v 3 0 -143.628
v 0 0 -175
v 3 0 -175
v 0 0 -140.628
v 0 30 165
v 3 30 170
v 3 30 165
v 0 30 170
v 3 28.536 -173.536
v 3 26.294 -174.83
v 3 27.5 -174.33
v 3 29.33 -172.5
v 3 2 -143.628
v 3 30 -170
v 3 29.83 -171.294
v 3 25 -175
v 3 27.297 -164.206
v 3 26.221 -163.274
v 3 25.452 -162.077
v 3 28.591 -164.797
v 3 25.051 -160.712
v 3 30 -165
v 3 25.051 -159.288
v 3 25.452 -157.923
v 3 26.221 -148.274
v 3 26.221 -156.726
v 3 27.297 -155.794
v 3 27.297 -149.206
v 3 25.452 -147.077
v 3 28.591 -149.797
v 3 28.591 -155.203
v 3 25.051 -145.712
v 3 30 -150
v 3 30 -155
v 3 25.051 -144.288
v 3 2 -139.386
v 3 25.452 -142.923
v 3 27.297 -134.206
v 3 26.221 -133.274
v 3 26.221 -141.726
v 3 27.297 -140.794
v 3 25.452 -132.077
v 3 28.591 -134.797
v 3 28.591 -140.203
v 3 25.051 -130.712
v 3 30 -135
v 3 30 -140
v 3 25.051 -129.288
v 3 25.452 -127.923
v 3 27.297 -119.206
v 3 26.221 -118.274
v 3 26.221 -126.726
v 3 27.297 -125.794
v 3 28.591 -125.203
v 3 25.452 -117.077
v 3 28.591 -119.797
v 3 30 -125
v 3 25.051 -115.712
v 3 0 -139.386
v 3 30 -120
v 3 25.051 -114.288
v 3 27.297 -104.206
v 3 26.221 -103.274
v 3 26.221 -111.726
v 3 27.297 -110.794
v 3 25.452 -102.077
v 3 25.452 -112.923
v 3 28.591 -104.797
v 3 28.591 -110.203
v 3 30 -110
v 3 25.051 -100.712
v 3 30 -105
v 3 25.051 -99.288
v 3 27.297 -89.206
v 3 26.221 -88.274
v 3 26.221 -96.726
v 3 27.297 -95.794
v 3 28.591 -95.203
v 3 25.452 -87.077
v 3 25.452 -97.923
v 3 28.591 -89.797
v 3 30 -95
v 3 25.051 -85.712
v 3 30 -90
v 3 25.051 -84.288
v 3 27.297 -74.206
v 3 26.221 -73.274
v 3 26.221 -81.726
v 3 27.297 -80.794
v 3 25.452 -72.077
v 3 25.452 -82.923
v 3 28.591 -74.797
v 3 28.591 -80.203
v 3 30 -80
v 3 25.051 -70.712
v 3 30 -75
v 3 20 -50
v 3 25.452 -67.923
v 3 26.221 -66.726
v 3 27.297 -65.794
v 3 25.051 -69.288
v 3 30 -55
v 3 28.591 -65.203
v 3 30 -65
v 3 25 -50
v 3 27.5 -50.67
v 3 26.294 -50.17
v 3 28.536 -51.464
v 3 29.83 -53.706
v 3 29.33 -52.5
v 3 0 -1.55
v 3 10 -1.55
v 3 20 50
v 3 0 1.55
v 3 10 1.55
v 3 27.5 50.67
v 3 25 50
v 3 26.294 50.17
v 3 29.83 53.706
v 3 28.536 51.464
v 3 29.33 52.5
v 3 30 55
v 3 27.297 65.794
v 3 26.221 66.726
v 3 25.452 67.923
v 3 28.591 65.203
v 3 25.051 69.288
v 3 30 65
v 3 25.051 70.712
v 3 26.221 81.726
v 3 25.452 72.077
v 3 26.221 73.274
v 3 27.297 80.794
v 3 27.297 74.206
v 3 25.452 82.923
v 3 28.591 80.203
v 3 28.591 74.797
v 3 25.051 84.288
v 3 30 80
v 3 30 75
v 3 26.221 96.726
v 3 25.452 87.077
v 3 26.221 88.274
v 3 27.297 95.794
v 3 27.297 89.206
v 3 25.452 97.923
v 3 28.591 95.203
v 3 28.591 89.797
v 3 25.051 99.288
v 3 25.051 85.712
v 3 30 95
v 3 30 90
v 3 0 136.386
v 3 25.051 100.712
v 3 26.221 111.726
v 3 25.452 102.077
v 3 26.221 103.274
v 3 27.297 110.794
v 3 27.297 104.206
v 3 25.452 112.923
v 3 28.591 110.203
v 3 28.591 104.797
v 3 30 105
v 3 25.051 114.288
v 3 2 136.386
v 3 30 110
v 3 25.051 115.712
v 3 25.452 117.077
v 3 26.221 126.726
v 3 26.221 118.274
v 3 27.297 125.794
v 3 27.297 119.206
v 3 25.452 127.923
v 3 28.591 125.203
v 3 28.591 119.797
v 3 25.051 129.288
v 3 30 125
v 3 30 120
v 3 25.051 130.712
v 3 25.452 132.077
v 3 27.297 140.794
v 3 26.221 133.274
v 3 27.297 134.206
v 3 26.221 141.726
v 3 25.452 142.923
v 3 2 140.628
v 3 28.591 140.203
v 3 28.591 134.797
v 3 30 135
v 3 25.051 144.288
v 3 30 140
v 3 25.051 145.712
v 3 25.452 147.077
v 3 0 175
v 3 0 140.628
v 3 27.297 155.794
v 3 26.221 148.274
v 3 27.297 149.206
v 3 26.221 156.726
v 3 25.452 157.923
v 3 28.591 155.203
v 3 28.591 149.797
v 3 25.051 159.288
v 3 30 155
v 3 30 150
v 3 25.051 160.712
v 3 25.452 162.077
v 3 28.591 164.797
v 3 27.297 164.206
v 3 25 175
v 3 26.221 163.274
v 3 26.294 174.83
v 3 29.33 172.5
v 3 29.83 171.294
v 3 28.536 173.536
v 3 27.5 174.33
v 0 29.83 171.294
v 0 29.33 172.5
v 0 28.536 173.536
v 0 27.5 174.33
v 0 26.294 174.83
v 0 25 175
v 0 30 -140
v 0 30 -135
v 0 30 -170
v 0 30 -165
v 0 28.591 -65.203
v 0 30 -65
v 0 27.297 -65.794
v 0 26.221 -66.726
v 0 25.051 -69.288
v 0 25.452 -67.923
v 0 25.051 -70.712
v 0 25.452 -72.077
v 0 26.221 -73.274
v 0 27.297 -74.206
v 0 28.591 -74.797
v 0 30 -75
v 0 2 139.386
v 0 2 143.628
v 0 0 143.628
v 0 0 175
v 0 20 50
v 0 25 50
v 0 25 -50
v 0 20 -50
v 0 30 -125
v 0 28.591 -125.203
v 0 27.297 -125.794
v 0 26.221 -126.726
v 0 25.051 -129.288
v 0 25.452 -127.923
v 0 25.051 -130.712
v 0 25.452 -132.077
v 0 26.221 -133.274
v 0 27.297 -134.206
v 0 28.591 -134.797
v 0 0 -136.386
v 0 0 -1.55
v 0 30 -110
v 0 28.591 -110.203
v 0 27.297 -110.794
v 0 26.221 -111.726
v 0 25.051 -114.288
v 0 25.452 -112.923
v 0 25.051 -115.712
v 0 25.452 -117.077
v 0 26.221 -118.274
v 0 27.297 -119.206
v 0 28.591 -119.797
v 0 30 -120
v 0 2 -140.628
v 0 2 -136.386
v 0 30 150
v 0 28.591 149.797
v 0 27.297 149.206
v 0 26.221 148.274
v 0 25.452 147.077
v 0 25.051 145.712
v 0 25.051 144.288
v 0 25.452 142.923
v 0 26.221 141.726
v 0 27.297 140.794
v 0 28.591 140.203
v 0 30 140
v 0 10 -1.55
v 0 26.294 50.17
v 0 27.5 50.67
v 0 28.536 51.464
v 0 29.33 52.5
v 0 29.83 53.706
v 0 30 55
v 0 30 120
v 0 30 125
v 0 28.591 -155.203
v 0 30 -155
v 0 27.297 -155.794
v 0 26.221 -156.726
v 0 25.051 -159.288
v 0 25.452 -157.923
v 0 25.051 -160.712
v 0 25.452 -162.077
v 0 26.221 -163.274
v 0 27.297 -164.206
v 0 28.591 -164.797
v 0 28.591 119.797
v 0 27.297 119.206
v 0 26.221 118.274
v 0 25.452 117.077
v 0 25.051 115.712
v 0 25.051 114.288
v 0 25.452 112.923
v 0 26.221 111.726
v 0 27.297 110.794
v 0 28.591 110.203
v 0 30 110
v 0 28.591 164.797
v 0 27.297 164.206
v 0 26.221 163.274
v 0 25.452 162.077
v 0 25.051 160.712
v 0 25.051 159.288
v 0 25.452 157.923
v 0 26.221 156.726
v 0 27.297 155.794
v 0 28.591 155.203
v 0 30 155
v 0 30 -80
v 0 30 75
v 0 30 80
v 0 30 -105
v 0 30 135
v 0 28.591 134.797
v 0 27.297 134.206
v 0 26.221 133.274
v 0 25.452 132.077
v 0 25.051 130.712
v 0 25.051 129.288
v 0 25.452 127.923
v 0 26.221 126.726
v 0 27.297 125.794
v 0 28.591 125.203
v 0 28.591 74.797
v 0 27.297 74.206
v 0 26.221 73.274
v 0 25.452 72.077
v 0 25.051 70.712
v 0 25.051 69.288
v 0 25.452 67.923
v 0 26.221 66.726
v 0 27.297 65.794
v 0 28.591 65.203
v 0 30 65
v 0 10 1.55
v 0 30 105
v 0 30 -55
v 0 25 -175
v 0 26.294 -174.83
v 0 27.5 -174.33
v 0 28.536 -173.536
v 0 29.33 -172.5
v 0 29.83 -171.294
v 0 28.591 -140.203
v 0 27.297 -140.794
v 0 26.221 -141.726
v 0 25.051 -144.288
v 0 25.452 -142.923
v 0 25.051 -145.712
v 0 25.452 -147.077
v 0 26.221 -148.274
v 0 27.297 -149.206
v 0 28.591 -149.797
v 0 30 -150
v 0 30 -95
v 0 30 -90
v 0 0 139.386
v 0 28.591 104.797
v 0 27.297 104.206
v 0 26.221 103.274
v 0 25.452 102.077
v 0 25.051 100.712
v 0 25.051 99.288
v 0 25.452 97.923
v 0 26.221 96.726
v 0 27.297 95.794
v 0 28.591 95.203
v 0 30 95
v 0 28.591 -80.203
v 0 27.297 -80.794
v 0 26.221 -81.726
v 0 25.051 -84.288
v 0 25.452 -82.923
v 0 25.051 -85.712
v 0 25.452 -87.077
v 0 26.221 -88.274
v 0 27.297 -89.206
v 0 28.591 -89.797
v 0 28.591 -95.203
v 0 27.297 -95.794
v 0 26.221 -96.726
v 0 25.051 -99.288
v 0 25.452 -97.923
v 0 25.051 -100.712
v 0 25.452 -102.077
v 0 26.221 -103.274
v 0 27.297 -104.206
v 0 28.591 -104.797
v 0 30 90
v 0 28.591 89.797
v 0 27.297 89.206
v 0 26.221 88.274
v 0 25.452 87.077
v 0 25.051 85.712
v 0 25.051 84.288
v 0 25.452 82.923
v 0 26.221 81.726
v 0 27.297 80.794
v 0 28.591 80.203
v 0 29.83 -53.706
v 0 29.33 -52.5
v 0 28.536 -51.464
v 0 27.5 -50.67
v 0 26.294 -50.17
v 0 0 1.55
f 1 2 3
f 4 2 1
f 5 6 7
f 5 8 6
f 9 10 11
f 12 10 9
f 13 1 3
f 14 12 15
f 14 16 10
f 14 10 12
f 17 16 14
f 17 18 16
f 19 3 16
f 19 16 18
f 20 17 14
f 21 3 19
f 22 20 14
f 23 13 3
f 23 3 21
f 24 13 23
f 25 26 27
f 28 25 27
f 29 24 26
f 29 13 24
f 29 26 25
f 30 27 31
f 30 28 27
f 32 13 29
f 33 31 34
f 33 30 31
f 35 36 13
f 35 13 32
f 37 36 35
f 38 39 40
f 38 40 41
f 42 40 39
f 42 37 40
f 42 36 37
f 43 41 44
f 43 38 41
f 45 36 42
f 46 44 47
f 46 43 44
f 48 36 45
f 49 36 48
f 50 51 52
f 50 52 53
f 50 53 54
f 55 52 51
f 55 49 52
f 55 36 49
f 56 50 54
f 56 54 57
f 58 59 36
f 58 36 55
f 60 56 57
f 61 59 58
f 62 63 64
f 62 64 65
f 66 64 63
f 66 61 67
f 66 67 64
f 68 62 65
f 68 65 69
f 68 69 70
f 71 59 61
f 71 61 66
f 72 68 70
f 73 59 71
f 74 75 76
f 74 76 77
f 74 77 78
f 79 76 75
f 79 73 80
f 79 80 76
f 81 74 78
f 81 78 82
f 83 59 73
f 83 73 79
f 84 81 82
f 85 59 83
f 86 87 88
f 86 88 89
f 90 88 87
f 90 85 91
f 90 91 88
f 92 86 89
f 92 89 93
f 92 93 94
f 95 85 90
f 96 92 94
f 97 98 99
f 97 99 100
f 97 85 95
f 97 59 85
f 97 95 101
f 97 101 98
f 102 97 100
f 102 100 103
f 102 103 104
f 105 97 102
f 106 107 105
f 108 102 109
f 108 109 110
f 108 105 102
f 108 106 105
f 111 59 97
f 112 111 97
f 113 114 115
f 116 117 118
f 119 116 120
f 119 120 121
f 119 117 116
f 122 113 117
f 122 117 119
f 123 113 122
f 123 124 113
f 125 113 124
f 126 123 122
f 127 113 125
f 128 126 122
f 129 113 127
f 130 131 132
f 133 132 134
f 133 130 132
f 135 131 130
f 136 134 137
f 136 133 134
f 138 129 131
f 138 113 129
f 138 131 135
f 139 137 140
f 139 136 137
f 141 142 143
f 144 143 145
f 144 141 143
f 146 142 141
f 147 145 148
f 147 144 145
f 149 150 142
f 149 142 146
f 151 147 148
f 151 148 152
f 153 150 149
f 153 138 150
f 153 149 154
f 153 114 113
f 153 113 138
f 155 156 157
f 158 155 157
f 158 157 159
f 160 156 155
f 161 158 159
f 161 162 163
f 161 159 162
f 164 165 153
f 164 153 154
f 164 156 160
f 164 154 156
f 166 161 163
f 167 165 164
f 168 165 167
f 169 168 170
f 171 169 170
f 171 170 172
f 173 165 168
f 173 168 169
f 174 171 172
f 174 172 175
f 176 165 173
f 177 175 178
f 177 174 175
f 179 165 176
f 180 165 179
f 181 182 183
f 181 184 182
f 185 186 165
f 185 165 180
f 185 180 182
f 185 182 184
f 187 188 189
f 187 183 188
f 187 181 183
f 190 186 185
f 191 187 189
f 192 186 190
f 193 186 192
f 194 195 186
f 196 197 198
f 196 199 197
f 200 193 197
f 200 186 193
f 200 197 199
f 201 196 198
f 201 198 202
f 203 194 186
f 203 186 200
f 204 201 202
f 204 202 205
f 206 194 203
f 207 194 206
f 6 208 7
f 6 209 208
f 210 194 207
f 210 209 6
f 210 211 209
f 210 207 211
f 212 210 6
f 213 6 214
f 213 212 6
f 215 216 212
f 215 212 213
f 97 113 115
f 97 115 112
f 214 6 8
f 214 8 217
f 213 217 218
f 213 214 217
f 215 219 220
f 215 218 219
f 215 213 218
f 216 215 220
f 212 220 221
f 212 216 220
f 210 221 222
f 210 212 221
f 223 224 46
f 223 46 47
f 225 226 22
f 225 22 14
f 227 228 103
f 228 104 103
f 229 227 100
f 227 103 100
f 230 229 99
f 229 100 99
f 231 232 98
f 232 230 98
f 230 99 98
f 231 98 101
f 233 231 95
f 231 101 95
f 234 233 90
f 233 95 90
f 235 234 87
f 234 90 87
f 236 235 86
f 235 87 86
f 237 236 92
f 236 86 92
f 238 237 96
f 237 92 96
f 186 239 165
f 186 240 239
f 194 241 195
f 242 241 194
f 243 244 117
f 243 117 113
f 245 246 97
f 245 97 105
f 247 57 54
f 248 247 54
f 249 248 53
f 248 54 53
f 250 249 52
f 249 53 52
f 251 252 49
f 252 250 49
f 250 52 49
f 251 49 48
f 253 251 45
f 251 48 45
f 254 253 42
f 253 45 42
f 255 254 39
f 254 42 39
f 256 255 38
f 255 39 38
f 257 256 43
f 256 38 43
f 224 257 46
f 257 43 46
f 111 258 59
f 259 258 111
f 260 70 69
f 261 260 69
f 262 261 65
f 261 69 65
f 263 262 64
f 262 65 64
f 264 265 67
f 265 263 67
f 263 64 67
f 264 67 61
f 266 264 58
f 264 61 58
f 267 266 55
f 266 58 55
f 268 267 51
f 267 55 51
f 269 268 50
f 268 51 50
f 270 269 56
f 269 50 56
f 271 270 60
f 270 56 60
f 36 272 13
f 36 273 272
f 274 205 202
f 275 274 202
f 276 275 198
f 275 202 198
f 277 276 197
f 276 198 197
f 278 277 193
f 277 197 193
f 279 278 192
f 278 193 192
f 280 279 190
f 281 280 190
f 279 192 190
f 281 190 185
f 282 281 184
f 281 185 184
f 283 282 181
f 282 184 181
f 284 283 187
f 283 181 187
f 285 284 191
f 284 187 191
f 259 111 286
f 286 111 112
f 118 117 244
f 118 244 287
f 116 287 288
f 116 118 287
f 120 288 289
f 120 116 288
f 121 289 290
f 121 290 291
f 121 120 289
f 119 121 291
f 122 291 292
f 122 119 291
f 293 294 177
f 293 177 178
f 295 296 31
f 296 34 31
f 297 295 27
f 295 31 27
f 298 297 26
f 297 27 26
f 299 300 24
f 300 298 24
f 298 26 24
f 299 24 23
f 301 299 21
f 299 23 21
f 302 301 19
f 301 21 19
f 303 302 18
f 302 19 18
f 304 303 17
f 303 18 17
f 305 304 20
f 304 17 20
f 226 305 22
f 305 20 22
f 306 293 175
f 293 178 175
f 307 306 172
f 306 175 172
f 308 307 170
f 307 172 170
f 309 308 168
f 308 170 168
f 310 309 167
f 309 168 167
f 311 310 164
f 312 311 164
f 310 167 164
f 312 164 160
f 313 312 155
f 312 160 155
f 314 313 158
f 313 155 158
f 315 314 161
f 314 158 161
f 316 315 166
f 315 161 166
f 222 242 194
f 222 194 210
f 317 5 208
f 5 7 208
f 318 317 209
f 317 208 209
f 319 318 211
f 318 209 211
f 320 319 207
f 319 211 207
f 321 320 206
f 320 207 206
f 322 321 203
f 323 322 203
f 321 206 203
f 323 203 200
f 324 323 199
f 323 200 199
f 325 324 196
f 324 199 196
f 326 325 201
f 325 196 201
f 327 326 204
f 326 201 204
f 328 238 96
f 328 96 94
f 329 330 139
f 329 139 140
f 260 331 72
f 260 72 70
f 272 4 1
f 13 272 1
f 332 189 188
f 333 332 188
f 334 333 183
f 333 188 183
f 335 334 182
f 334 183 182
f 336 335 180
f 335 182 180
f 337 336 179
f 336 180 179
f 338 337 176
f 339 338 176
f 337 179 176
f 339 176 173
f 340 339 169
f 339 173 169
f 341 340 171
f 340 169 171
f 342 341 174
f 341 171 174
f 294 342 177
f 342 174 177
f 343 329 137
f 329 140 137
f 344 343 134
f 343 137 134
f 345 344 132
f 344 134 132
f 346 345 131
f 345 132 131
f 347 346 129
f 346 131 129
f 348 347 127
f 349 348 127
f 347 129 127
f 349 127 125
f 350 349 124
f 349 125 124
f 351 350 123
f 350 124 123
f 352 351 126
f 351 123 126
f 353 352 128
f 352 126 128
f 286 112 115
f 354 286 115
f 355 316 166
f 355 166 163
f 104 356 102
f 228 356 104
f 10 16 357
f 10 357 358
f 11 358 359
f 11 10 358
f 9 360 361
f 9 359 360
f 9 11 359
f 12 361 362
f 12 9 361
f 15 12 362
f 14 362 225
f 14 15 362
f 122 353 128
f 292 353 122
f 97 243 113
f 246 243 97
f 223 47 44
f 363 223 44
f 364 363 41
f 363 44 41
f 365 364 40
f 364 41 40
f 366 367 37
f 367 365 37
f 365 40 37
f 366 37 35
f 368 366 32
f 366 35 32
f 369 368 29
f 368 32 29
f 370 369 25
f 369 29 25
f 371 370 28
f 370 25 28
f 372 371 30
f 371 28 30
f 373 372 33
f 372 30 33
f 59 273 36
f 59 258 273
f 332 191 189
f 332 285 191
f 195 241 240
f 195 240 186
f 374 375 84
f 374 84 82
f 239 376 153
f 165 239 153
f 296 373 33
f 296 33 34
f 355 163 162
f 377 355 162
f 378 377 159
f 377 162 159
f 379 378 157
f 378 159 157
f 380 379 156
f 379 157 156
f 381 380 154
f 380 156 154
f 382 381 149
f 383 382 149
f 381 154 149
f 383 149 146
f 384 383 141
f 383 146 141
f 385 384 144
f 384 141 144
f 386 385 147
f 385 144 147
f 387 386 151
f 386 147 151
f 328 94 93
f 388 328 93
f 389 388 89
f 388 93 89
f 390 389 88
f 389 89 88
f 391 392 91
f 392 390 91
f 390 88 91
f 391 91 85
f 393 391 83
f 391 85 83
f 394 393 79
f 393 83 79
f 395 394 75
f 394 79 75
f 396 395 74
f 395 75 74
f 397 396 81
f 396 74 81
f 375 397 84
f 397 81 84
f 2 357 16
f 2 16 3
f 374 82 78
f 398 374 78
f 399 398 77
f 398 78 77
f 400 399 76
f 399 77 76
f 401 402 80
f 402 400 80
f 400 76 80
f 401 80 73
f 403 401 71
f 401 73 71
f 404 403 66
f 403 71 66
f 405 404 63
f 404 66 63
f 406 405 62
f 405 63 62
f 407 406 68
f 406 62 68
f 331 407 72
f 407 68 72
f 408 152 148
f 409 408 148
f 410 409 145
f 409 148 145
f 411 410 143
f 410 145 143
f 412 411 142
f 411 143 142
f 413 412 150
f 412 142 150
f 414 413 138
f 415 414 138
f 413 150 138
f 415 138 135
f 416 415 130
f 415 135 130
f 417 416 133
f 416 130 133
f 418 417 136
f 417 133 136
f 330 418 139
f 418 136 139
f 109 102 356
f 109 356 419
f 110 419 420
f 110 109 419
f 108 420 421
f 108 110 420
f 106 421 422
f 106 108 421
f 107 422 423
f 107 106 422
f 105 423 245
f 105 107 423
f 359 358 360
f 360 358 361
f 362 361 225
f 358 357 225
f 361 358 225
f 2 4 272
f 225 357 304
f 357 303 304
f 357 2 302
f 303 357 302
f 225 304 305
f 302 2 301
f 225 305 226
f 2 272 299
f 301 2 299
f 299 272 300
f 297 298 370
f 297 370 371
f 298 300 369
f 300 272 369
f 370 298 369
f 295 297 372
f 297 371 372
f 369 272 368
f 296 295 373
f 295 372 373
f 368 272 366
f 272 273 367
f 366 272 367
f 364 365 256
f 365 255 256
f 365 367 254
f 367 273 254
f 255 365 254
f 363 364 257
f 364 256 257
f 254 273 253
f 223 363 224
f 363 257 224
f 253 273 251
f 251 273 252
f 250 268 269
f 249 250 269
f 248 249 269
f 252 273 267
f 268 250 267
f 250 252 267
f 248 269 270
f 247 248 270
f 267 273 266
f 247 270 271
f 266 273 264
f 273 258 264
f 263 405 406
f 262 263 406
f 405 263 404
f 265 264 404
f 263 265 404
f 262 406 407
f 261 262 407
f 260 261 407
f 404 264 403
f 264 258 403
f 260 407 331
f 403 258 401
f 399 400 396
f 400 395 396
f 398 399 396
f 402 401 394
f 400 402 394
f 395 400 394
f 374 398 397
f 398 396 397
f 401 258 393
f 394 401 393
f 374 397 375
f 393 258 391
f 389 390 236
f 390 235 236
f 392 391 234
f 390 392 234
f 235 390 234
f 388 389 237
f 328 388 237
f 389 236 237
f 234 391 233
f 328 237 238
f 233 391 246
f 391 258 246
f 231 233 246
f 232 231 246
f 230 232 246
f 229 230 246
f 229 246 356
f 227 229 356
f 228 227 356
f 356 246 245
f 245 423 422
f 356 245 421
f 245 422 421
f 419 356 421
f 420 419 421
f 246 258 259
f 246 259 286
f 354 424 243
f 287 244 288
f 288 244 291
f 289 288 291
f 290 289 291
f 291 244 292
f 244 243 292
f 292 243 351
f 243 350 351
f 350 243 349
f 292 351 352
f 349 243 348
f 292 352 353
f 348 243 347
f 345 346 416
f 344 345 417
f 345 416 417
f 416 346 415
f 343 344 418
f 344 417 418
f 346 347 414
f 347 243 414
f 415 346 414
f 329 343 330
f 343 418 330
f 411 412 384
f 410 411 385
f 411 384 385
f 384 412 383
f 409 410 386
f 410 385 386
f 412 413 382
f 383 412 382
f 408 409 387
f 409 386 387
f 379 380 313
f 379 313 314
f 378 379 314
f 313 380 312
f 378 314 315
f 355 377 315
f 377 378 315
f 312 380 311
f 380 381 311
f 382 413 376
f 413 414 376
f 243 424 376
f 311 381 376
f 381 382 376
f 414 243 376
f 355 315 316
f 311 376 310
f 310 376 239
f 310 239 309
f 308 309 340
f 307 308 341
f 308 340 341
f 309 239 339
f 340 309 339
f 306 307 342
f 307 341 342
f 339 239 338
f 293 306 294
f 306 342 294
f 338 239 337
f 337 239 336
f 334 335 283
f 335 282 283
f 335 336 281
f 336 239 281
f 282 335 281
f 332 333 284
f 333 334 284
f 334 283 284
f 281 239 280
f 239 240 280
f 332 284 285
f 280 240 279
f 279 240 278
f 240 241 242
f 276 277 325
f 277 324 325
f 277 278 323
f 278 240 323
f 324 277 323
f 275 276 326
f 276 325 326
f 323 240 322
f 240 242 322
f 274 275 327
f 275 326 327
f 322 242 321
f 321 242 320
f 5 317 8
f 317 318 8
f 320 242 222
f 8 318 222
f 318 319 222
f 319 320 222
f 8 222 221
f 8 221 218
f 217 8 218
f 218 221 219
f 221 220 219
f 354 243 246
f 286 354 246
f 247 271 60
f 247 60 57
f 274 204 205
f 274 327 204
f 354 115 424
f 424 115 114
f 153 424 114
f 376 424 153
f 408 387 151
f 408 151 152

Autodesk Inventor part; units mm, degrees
ref_plane "YZ Plane" through (0, 0, 0) normal (1, 0, 0) x (0, 1, 0)
ref_plane "XZ Plane" through (0, 0, 0) normal (0, 1, 0) x (-1, 0, 0)
ref_plane "XY Plane" through (0, 0, 0) normal (0, 0, 1) x (1, 0, 0)
sketch "Sketch1" plane through (0, 0, 0) normal (1, 0, 0) x (0, 1, 0)
  line L0 (0, 175) -> (30, 175)
  line L1 (30, 175) -> (30, -175)
  line L2 (30, -175) -> (0, -175)
  line L3 (0, -175) -> (0, 175)
  line L4 (30, 50) -> (20, 50)
  line L5 (20, 50) -> (20, -50)
  line L6 (20, -50) -> (30, -50)
  line L7 (30, -50) -> (30, 50)
  point P0 (0, 0)
  point P1 (0, 0)
  point P2 (20, 0)
  dimension "d0" = 30
  dimension "d1" = 350
  dimension "d2" = 0
  dimension "d3" = 100
  dimension "d4" = 0
  dimension "d5" = 10
extrude "Extrusion1" add sketch "Sketch1" along normal blind 3 contours L0 L1 L4 L5 L6 L2 L3
sketch "Sketch2" plane through (3, 0, 0) normal (1, 0, 0) x (0, 0, -1)
  line L0 (-1.55, -10) -> (1.55, -10)
  line L1 (1.55, 0) -> (1.55, 10)
  line L2 (1.55, 10) -> (-1.55, 10)
  line L3 (-1.55, 10) -> (-1.55, 0)
  line L4 (-1.55, -10) -> (1.55, 10) construction
  line L5 (1.55, -10) -> (-1.55, 10) construction
  line L6 (-175, 0) -> (175, 0) projected
  line L7 (175, 0) -> (175, 30) projected
  line L8 (175, 30) -> (50, 30) projected
  line L9 (50, 30) -> (50, 20) projected
  line L10 (50, 20) -> (-50, 20) projected
  line L11 (-50, 20) -> (-50, 30) projected
  line L12 (-50, 30) -> (-175, 30) projected
  line L13 (-175, 30) -> (-175, 0) projected
  point P0 (0, 0)
  dimension "d8" = 3.1
  dimension "d9" = 20
extrude "Extrusion2" cut sketch "Sketch2" against normal blind 3 contours L6 L3 L2 L1
sketch "Sketch3" plane through (3, 0, 0) normal (1, 0, 0) x (0, 0, -1)
  line L0 (-50, 30) -> (-175, 30) projected
  circle A0 centre (-160, 30) radius 5
  circle A1 centre (-145, 30) radius 5
  circle A2 centre (-130, 30) radius 5
  circle A3 centre (-115, 30) radius 5
  circle A4 centre (-85, 30) radius 5
  circle A5 centre (-100, 30) radius 5
  line L1 (-175, 30) -> (-175, 0) projected
  circle A6 centre (-70, 30) radius 5
  point P0 (0, 0)
  point P1 (-75, 30)
  point P2 (-65, 30)
  point P3 (-90, 30)
  point P4 (-80, 30)
  point P5 (-105, 30)
  point P6 (-95, 30)
  point P7 (-120, 30)
  point P8 (-110, 30)
  point P9 (-135, 30)
  point P10 (-125, 30)
  point P11 (-150, 30)
  point P12 (-140, 30)
  point P13 (-165, 30)
  point P14 (-155, 30)
  dimension "d12" = 10
  dimension "d13" = 10
  dimension "d14" = 10
  dimension "d16" = 10
  dimension "d17" = 10
  dimension "d18" = 10
  dimension "d19" = 15
  dimension "d20" = 15
  dimension "d21" = 15
  dimension "d22" = 15
  dimension "d23" = 15
  dimension "d24" = 15
  dimension "d25" = 10
  dimension "d26" = 15
extrude "Extrusion3" cut sketch "Sketch3" against normal blind 3 contours A6 L0 | A0 L0 | A1 L0 | A2 L0 | A3 L0 | A5 L0 | A4 L0 picked at (-68.8623, 27.8538) picked at (-161.4384, 28.1203) picked at (-146.4384, 28.1203) picked at (-131.2475, 28.8948) picked at (-113.8623, 27.8538) picked at (-98.8623, 27.8538) picked at (-83.8623, 27.8538)
fillet "Fillet1" radius 5 1 edges at (1.5, 30, 175)
fillet "Fillet2" radius 5 1 edges at (1.5, 30, 50)
mirror "Mirror1" about plane through (0, 0, 0) normal (0, 0, 1) of "Extrusion3", "Fillet1", "Fillet2"
sketch "Sketch6" plane through (0, 0, 1.55) normal (0, -1, 0) x (1, 0, 0)
  line L0 (0, 0) -> (3, 0) projected
  line L1 (3, 173.45) -> (3, 0) projected
  line L2 (0, 173.45) -> (3, 173.45) projected
  line L3 (0, 173.45) -> (0, 0) projected
  line L4 (3, -3.1) -> (0, -3.1) projected
  line L5 (0, -3.1) -> (0, -176.55) projected
  line L6 (0, -176.55) -> (3, -176.55) projected
  line L7 (3, -3.1) -> (3, -176.55) projected
  line L8 (0, 142.0785) -> (3, 139.0785)
  line L9 (0, 137.8358) -> (3, 134.8358)
  line L10 (0, -137.9358) -> (3, -140.9358)
  line L11 (0, -142.1785) -> (3, -145.1785)
  line L12 (3, 0) -> (3, -3.1) projected
  line L13 (0, -1.55) -> (3, -1.55)
  point P0 (1.5, -1.55)
  dimension "d42" = 45
  dimension "d43" = 3
  dimension "d44" = 3
  dimension "d45" = 195
  dimension "d50" = 97.5
extrude "Extrusion5" cut sketch "Sketch6" against normal blind 2 contours L3 L8 L1 L9 | L7 L11 L5 L10
equation "\"d13\" = d12"
equation "\"d14\" = d12"
equation "\"d16\" = d12"
equation "\"d17\" = d12"
equation "\"d18\" = d12"
equation "\"d21\" = d20"
equation "\"d22\" = d21"
equation "\"d23\" = d22"
equation "\"d24\" = d23"
equation "\"d25\" = d12"
equation "\"d26\" = d24"
properties part number "StoveTop1" material "Steel"
